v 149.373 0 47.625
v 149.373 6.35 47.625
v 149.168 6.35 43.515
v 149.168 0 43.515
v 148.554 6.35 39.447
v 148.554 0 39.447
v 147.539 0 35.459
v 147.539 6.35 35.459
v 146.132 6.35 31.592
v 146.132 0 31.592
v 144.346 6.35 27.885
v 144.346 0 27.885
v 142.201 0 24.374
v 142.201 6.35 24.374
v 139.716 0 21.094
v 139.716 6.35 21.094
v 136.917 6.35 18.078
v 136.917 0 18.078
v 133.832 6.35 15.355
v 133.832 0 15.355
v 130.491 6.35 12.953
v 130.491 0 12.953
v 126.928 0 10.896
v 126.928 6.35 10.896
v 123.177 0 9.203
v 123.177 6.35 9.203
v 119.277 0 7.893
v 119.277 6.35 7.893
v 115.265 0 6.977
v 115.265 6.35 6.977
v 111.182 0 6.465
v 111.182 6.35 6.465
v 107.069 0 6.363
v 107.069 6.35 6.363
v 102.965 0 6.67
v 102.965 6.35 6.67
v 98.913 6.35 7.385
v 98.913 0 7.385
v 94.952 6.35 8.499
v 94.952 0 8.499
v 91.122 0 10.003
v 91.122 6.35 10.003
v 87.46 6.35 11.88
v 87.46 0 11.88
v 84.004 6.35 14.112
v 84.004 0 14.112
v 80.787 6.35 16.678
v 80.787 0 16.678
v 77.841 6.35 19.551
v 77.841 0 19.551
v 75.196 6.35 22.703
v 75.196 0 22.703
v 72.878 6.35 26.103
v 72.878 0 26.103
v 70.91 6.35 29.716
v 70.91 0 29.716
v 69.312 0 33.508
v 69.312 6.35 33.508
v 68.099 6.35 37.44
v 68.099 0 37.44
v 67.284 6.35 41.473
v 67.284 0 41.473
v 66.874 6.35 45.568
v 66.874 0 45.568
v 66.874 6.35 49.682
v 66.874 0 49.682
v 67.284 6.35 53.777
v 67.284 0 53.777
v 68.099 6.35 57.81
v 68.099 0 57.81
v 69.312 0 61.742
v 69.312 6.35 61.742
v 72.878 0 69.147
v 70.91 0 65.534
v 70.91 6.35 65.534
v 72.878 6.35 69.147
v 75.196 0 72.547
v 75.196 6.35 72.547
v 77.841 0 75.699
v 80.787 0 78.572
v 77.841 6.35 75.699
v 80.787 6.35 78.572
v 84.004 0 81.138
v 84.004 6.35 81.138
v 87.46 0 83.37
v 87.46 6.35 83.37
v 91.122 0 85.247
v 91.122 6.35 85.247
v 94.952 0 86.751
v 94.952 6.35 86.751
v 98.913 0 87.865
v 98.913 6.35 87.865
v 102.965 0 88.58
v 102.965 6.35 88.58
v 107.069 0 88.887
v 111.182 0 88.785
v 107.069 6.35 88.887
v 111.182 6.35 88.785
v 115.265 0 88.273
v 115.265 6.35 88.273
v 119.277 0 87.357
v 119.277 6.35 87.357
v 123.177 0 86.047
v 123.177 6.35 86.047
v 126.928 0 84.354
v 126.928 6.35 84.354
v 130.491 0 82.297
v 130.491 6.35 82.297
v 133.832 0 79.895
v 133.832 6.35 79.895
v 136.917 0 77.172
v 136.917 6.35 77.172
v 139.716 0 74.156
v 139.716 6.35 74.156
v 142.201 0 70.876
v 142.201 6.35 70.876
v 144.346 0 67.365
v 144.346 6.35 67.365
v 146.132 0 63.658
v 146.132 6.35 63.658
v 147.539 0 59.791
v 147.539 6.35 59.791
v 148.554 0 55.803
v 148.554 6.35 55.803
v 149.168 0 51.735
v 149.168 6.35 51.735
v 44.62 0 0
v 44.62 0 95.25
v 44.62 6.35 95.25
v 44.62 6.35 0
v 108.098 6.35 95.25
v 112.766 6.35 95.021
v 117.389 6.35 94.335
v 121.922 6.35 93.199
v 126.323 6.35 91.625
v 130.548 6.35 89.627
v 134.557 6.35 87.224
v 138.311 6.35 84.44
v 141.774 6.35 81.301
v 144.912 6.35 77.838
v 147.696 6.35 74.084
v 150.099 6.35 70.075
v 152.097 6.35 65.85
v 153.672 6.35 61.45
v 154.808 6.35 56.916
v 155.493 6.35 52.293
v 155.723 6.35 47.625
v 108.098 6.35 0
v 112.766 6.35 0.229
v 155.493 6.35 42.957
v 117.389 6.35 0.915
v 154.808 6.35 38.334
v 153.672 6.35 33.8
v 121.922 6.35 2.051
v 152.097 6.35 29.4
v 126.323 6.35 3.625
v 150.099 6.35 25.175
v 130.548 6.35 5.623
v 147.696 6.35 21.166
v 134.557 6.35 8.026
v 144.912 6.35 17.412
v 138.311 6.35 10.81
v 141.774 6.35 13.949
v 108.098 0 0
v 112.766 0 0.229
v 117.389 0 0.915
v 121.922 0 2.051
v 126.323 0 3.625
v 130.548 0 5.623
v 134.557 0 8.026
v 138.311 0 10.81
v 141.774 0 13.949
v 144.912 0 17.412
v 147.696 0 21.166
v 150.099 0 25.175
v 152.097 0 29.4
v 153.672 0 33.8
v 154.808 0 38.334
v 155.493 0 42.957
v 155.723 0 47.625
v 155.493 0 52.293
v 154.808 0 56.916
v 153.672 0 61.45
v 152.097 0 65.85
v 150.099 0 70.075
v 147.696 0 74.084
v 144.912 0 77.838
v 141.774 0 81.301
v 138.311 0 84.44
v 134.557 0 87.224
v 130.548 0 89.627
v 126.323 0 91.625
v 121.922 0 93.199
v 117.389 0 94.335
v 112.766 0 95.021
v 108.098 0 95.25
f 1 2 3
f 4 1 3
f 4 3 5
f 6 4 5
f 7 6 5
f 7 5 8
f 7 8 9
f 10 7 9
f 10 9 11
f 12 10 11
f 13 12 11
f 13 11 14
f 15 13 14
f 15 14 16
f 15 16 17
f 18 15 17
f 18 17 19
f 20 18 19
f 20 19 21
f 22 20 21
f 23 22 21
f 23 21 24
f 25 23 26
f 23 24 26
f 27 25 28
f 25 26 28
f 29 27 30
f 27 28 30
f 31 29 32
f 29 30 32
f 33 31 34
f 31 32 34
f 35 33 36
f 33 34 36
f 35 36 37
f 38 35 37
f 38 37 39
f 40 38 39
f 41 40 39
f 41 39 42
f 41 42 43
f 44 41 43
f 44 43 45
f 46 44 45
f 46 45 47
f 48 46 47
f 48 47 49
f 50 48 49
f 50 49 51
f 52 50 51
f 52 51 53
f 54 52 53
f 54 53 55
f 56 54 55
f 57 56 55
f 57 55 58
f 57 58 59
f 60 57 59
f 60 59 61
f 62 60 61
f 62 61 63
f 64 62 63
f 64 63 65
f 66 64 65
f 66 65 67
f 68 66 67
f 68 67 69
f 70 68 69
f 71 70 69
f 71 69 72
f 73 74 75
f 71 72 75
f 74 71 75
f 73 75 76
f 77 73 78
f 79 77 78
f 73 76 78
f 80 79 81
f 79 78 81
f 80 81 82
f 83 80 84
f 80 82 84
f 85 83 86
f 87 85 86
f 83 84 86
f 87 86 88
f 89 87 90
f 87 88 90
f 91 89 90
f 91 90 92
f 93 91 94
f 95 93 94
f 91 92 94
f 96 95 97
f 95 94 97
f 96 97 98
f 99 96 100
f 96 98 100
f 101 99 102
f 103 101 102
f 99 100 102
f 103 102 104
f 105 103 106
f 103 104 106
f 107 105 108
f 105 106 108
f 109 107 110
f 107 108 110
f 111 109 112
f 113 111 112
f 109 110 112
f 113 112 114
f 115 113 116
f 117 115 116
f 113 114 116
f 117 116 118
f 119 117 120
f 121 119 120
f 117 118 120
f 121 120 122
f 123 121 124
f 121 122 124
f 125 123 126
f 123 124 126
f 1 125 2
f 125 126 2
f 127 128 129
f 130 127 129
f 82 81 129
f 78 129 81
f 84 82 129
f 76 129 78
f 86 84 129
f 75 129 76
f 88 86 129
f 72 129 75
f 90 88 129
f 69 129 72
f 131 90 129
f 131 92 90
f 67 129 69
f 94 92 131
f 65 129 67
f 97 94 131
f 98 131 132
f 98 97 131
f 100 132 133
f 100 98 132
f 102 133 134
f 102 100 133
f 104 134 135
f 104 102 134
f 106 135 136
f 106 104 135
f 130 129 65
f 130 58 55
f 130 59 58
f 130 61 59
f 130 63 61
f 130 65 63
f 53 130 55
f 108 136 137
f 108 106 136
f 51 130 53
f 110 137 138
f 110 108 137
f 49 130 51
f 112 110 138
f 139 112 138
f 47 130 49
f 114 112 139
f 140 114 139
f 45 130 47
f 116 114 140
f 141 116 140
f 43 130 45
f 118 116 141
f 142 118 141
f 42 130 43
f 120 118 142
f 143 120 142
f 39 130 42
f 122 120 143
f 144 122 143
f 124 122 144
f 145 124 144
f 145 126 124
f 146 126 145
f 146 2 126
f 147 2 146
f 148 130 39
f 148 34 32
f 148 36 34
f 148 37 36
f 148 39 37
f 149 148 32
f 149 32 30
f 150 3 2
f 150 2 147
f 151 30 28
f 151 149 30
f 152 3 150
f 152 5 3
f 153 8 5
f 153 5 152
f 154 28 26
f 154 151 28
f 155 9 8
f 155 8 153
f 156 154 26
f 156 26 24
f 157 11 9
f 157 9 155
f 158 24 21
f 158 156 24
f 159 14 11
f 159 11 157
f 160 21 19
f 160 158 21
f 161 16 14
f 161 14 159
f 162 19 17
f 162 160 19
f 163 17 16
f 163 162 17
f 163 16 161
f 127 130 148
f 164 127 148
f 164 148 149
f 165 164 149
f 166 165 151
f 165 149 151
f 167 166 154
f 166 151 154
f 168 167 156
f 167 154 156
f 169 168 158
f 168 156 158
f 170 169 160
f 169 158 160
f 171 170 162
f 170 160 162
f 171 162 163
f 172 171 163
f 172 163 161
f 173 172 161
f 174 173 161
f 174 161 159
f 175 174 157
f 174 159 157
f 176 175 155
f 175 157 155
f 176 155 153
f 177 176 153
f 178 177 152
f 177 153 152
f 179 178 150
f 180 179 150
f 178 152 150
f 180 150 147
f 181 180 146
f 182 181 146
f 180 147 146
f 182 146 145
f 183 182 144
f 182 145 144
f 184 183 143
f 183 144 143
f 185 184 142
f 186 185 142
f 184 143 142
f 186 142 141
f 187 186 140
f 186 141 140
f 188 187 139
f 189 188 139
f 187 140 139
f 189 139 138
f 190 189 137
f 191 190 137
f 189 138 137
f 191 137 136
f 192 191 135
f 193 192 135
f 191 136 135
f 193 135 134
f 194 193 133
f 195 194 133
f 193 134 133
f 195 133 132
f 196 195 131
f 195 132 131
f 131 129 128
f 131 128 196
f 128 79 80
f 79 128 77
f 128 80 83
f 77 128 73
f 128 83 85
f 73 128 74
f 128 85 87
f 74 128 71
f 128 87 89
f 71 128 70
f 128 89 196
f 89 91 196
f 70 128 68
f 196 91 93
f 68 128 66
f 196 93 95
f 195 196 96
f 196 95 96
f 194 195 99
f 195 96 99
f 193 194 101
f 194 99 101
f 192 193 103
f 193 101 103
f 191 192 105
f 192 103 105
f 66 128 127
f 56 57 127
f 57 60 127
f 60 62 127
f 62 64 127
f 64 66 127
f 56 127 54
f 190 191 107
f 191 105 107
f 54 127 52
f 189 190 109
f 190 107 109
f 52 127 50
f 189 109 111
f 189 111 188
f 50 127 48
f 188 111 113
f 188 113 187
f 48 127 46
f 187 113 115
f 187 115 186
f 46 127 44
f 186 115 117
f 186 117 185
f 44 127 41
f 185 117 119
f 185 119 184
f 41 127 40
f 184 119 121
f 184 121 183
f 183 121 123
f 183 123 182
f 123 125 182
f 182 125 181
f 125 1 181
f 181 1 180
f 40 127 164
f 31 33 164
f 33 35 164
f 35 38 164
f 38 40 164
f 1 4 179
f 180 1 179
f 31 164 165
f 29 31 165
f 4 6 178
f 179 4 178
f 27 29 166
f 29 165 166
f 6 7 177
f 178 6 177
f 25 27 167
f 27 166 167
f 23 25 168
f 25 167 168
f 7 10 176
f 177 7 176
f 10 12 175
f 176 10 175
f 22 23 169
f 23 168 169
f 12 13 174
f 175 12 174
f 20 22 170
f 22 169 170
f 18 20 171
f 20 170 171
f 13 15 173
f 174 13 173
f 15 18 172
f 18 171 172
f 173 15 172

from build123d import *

# Parameters (mm, degrees)
SKETCH2_W           = 111.10281597
SKETCH2_H           = 6.35
BOSS_EXTRUDE1_DEPTH = 95.25
SKETCH3_R           = 41.275
CUT_EXTRUDE2_DEPTH  = 7.35
CUT_EXTRUDE3_DEPTH  = 7.35


with BuildPart() as part:
    # Sketch2 → Boss-Extrude1 (new body)
    with BuildSketch(Plane.XY):
        with Locations((100.171199764, 3.175)):
            Rectangle(SKETCH2_W, SKETCH2_H)
    extrude(amount=BOSS_EXTRUDE1_DEPTH)

    # Sketch3 → Cut-Extrude2 (cut, through all)
    with BuildSketch(Plane(origin=(0, 6.35, 0), x_dir=(1, 0, 0), z_dir=(0, 1, 0))):
        with Locations((108.097607749, -47.625)):
            Circle(SKETCH3_R)
    extrude(amount=-CUT_EXTRUDE2_DEPTH, mode=Mode.SUBTRACT)

    # Sketch4 → Cut-Extrude3 (cut, through all)
    with BuildSketch(Plane(origin=(0, 6.35, 0), x_dir=(1, 0, 0), z_dir=(0, 1, 0))):
        with BuildLine():
            Line((108.097607749, -95.25), (179.051442703, -95.25))
            Line((179.051442703, -95.25), (179.051442703, 0))
            Line((179.051442703, 0), (108.097607749, 0))
            ThreePointArc((108.097607749, 0), (155.722607749, -47.625), (108.097607749, -95.25))
        make_face()
    extrude(amount=-CUT_EXTRUDE3_DEPTH, mode=Mode.SUBTRACT)


solid = part.part
